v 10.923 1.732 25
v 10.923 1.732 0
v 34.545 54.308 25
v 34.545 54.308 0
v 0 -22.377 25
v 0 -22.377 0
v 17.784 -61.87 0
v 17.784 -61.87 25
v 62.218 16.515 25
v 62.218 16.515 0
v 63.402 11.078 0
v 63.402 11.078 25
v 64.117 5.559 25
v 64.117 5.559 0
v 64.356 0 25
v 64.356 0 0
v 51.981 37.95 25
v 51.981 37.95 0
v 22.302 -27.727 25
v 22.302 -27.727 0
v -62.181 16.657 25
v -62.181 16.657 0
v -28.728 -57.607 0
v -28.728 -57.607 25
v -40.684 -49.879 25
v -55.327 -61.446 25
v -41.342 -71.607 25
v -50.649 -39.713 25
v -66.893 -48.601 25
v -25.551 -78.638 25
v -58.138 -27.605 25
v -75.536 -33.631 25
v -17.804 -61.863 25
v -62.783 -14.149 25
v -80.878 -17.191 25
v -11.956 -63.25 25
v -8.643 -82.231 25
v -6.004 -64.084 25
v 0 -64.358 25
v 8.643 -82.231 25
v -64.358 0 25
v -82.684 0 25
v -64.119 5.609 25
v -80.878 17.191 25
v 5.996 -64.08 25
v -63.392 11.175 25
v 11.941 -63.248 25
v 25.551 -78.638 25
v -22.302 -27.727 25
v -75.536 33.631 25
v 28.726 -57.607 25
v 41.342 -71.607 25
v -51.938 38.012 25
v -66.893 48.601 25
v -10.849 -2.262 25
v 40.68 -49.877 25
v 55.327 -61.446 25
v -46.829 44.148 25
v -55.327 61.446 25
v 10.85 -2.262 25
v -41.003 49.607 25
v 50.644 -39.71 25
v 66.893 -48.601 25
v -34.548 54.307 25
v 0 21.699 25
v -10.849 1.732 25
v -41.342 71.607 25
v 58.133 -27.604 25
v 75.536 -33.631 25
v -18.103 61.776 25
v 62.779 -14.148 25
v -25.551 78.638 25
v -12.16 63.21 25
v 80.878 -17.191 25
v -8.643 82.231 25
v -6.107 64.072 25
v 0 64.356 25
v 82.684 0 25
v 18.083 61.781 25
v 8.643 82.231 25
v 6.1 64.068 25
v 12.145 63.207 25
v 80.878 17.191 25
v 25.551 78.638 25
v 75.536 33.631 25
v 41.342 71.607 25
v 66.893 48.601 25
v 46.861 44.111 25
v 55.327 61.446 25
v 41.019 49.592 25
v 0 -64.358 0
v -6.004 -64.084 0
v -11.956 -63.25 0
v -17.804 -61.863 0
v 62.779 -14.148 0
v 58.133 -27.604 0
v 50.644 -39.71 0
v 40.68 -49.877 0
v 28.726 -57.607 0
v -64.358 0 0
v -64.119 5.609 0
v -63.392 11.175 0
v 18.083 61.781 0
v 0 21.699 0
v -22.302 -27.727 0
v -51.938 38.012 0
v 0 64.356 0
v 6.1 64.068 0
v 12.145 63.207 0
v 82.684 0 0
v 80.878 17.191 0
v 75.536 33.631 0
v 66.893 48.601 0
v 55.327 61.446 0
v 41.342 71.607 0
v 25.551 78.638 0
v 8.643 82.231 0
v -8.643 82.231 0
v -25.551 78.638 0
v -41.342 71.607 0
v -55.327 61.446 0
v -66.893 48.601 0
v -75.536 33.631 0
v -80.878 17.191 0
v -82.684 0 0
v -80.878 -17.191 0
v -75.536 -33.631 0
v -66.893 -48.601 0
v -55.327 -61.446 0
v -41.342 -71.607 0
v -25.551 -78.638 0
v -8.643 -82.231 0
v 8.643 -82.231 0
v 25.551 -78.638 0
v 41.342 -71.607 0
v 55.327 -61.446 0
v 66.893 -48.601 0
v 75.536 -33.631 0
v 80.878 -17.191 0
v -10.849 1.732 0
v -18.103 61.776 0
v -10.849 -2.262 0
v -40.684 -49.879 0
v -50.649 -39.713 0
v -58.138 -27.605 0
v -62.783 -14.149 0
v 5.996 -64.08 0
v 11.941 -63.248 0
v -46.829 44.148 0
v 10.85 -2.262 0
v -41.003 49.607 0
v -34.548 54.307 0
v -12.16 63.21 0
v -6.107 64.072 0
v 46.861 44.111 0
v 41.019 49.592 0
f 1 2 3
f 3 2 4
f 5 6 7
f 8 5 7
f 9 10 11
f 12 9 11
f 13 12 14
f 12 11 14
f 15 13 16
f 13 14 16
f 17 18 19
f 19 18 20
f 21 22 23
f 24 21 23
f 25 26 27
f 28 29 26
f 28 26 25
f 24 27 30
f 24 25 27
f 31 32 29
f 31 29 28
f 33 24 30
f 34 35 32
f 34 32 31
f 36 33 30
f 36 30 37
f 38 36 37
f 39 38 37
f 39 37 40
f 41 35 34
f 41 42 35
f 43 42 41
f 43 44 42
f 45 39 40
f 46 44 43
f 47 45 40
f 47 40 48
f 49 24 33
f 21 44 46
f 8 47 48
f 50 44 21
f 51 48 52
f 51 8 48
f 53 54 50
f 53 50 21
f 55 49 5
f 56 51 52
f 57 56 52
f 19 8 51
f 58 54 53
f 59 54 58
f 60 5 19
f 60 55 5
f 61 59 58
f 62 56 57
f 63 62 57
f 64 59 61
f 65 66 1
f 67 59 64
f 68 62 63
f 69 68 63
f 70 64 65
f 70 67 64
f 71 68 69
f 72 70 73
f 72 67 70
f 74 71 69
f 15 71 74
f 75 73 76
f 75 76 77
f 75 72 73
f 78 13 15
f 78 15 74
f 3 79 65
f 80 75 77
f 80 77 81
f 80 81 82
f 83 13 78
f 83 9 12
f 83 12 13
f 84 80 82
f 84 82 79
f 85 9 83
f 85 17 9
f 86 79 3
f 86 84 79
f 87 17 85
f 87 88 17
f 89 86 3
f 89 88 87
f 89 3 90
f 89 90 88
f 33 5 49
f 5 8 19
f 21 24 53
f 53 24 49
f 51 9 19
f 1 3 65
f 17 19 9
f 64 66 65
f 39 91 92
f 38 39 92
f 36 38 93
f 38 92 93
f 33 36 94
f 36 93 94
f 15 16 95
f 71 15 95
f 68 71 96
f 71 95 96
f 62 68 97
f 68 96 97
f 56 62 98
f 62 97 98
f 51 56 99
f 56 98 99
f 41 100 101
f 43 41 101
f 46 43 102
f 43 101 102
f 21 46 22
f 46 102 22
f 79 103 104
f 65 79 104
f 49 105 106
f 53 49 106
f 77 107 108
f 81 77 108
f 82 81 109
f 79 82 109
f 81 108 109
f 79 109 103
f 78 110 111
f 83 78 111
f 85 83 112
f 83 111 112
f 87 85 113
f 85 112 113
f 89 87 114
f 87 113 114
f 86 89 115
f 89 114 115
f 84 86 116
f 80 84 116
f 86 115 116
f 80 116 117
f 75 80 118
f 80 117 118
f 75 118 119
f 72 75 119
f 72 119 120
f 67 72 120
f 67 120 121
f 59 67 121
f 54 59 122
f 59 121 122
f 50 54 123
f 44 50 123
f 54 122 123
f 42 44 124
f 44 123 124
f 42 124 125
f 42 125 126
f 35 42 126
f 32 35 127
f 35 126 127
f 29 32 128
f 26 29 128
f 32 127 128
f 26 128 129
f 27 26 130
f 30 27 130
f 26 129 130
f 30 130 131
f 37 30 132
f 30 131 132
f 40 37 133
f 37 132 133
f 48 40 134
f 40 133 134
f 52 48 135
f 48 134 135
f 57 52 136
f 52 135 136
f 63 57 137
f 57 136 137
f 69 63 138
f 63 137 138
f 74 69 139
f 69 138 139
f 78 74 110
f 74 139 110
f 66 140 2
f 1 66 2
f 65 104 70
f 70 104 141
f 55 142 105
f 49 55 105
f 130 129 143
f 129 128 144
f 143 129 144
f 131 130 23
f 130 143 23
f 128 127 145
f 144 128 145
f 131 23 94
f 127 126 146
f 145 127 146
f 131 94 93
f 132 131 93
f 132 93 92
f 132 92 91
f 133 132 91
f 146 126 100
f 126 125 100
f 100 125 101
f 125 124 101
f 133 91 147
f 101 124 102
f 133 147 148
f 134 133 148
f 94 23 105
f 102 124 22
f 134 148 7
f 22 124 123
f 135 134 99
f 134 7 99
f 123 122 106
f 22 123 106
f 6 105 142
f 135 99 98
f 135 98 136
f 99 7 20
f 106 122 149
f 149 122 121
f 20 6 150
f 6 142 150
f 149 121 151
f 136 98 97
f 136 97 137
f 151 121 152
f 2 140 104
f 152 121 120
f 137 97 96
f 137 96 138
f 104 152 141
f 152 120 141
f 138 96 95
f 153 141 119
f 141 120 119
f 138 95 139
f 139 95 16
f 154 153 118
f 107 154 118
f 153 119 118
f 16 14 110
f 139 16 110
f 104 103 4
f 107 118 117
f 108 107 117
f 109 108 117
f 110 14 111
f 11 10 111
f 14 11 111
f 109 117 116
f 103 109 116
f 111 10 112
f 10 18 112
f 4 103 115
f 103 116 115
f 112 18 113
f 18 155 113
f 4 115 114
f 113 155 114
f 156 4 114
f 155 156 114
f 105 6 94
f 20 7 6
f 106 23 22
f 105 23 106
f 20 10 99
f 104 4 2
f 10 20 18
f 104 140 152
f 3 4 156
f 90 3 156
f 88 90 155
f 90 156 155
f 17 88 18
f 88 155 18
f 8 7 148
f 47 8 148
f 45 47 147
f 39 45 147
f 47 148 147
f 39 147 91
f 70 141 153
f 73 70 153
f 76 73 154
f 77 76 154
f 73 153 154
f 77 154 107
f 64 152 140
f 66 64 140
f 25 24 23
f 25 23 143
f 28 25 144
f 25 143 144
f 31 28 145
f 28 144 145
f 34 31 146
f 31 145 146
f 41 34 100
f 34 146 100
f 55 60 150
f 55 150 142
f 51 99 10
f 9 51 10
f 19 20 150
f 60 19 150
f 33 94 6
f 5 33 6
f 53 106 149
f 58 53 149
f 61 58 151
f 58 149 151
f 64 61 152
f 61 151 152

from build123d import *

# Parameters (mm, degrees)
F1_DEPTH = 25


# Not quite as in the source:
# - ends of sketch curves that miss each other by under 0.0002 mm in the source are joined


with BuildPart() as f1:
    # F0 (on Top) → F1 (new body)
    with BuildSketch(Plane.XY):
        with BuildLine():
            ThreePointArc((-82.6844, 0), (0, -82.6844), (82.6844, 0))
            ThreePointArc((82.6844, 0), (0, 82.6844), (-82.6844, 0))
        make_face()
        with BuildLine():
            ThreePointArc((-0.0001019994, -64.3575904446), (-8.9899783863, -63.7364917021), (-17.8043990333, -61.8630911161))
            Line((-17.8043990333, -61.8630911161), (0, -22.3774))
            Line((0, -22.3774), (17.7835, -61.8695))
            ThreePointArc((17.7835, -61.8695), (8.9783061535, -63.7325605397), (-0.0001019994, -64.3575904446))
        make_face(mode=Mode.SUBTRACT)
        with BuildLine():
            ThreePointArc((-64.3576040742, 5e-06), (-63.8166972636, 8.3999218175), (-62.181104878, 16.6567989674))
            Line((-62.181104878, 16.6567989674), (-28.7278, -57.6069))
            ThreePointArc((-28.7278, -57.6069), (-54.7289693105, -33.866650173), (-64.3576040742, 5e-06))
        make_face(mode=Mode.SUBTRACT)
        with BuildLine():
            ThreePointArc((64.356106725, 9e-06), (54.7239343065, -33.864451622), (28.7263060265, -57.6068980531))
            Line((28.7263060265, -57.6068980531), (62.2183, 16.5153))
            ThreePointArc((62.2183, 16.5153), (63.8186125658, 8.3264340159), (64.356106725, 9e-06))
        make_face(mode=Mode.SUBTRACT)
        with BuildLine():
            Line((0, 21.6991), (-18.1035, 61.7762))
            ThreePointArc((-18.1035, 61.7762), (-9.143995, 63.7130624999), (-9.9e-05, 64.355997063))
            ThreePointArc((-9.9e-05, 64.355997063), (9.132463164, 63.7090225476), (18.0825989725, 61.7810009054))
            Line((18.0825989725, 61.7810009054), (0, 21.6991))
        make_face(mode=Mode.SUBTRACT)
        with BuildLine():
            Line((10.9234, 1.7325), (34.545, 54.3084))
            ThreePointArc((34.545, 54.3084), (44.0251133087, 46.9417504609), (51.9809939632, 37.9504079731))
            Line((51.9809939632, 37.9504079731), (22.3019, -27.7266))
            Line((22.3019, -27.7266), (10.8496, -2.2616))
            Line((10.8496, -2.2616), (-10.8494, -2.2616))
            Line((-10.8494, -2.2616), (-22.3016, -27.7266))
            Line((-22.3016, -27.7266), (-51.9378, 38.0118))
            ThreePointArc((-51.9378, 38.0118), (-44.0003546147, 46.9677472651), (-34.5479019666, 54.3069079476))
            Line((-34.5479019666, 54.3069079476), (-10.8494, 1.7325))
            Line((-10.8494, 1.7325), (10.9234, 1.7325))
        make_face(mode=Mode.SUBTRACT)
    extrude(amount=F1_DEPTH)


solid = f1.part
